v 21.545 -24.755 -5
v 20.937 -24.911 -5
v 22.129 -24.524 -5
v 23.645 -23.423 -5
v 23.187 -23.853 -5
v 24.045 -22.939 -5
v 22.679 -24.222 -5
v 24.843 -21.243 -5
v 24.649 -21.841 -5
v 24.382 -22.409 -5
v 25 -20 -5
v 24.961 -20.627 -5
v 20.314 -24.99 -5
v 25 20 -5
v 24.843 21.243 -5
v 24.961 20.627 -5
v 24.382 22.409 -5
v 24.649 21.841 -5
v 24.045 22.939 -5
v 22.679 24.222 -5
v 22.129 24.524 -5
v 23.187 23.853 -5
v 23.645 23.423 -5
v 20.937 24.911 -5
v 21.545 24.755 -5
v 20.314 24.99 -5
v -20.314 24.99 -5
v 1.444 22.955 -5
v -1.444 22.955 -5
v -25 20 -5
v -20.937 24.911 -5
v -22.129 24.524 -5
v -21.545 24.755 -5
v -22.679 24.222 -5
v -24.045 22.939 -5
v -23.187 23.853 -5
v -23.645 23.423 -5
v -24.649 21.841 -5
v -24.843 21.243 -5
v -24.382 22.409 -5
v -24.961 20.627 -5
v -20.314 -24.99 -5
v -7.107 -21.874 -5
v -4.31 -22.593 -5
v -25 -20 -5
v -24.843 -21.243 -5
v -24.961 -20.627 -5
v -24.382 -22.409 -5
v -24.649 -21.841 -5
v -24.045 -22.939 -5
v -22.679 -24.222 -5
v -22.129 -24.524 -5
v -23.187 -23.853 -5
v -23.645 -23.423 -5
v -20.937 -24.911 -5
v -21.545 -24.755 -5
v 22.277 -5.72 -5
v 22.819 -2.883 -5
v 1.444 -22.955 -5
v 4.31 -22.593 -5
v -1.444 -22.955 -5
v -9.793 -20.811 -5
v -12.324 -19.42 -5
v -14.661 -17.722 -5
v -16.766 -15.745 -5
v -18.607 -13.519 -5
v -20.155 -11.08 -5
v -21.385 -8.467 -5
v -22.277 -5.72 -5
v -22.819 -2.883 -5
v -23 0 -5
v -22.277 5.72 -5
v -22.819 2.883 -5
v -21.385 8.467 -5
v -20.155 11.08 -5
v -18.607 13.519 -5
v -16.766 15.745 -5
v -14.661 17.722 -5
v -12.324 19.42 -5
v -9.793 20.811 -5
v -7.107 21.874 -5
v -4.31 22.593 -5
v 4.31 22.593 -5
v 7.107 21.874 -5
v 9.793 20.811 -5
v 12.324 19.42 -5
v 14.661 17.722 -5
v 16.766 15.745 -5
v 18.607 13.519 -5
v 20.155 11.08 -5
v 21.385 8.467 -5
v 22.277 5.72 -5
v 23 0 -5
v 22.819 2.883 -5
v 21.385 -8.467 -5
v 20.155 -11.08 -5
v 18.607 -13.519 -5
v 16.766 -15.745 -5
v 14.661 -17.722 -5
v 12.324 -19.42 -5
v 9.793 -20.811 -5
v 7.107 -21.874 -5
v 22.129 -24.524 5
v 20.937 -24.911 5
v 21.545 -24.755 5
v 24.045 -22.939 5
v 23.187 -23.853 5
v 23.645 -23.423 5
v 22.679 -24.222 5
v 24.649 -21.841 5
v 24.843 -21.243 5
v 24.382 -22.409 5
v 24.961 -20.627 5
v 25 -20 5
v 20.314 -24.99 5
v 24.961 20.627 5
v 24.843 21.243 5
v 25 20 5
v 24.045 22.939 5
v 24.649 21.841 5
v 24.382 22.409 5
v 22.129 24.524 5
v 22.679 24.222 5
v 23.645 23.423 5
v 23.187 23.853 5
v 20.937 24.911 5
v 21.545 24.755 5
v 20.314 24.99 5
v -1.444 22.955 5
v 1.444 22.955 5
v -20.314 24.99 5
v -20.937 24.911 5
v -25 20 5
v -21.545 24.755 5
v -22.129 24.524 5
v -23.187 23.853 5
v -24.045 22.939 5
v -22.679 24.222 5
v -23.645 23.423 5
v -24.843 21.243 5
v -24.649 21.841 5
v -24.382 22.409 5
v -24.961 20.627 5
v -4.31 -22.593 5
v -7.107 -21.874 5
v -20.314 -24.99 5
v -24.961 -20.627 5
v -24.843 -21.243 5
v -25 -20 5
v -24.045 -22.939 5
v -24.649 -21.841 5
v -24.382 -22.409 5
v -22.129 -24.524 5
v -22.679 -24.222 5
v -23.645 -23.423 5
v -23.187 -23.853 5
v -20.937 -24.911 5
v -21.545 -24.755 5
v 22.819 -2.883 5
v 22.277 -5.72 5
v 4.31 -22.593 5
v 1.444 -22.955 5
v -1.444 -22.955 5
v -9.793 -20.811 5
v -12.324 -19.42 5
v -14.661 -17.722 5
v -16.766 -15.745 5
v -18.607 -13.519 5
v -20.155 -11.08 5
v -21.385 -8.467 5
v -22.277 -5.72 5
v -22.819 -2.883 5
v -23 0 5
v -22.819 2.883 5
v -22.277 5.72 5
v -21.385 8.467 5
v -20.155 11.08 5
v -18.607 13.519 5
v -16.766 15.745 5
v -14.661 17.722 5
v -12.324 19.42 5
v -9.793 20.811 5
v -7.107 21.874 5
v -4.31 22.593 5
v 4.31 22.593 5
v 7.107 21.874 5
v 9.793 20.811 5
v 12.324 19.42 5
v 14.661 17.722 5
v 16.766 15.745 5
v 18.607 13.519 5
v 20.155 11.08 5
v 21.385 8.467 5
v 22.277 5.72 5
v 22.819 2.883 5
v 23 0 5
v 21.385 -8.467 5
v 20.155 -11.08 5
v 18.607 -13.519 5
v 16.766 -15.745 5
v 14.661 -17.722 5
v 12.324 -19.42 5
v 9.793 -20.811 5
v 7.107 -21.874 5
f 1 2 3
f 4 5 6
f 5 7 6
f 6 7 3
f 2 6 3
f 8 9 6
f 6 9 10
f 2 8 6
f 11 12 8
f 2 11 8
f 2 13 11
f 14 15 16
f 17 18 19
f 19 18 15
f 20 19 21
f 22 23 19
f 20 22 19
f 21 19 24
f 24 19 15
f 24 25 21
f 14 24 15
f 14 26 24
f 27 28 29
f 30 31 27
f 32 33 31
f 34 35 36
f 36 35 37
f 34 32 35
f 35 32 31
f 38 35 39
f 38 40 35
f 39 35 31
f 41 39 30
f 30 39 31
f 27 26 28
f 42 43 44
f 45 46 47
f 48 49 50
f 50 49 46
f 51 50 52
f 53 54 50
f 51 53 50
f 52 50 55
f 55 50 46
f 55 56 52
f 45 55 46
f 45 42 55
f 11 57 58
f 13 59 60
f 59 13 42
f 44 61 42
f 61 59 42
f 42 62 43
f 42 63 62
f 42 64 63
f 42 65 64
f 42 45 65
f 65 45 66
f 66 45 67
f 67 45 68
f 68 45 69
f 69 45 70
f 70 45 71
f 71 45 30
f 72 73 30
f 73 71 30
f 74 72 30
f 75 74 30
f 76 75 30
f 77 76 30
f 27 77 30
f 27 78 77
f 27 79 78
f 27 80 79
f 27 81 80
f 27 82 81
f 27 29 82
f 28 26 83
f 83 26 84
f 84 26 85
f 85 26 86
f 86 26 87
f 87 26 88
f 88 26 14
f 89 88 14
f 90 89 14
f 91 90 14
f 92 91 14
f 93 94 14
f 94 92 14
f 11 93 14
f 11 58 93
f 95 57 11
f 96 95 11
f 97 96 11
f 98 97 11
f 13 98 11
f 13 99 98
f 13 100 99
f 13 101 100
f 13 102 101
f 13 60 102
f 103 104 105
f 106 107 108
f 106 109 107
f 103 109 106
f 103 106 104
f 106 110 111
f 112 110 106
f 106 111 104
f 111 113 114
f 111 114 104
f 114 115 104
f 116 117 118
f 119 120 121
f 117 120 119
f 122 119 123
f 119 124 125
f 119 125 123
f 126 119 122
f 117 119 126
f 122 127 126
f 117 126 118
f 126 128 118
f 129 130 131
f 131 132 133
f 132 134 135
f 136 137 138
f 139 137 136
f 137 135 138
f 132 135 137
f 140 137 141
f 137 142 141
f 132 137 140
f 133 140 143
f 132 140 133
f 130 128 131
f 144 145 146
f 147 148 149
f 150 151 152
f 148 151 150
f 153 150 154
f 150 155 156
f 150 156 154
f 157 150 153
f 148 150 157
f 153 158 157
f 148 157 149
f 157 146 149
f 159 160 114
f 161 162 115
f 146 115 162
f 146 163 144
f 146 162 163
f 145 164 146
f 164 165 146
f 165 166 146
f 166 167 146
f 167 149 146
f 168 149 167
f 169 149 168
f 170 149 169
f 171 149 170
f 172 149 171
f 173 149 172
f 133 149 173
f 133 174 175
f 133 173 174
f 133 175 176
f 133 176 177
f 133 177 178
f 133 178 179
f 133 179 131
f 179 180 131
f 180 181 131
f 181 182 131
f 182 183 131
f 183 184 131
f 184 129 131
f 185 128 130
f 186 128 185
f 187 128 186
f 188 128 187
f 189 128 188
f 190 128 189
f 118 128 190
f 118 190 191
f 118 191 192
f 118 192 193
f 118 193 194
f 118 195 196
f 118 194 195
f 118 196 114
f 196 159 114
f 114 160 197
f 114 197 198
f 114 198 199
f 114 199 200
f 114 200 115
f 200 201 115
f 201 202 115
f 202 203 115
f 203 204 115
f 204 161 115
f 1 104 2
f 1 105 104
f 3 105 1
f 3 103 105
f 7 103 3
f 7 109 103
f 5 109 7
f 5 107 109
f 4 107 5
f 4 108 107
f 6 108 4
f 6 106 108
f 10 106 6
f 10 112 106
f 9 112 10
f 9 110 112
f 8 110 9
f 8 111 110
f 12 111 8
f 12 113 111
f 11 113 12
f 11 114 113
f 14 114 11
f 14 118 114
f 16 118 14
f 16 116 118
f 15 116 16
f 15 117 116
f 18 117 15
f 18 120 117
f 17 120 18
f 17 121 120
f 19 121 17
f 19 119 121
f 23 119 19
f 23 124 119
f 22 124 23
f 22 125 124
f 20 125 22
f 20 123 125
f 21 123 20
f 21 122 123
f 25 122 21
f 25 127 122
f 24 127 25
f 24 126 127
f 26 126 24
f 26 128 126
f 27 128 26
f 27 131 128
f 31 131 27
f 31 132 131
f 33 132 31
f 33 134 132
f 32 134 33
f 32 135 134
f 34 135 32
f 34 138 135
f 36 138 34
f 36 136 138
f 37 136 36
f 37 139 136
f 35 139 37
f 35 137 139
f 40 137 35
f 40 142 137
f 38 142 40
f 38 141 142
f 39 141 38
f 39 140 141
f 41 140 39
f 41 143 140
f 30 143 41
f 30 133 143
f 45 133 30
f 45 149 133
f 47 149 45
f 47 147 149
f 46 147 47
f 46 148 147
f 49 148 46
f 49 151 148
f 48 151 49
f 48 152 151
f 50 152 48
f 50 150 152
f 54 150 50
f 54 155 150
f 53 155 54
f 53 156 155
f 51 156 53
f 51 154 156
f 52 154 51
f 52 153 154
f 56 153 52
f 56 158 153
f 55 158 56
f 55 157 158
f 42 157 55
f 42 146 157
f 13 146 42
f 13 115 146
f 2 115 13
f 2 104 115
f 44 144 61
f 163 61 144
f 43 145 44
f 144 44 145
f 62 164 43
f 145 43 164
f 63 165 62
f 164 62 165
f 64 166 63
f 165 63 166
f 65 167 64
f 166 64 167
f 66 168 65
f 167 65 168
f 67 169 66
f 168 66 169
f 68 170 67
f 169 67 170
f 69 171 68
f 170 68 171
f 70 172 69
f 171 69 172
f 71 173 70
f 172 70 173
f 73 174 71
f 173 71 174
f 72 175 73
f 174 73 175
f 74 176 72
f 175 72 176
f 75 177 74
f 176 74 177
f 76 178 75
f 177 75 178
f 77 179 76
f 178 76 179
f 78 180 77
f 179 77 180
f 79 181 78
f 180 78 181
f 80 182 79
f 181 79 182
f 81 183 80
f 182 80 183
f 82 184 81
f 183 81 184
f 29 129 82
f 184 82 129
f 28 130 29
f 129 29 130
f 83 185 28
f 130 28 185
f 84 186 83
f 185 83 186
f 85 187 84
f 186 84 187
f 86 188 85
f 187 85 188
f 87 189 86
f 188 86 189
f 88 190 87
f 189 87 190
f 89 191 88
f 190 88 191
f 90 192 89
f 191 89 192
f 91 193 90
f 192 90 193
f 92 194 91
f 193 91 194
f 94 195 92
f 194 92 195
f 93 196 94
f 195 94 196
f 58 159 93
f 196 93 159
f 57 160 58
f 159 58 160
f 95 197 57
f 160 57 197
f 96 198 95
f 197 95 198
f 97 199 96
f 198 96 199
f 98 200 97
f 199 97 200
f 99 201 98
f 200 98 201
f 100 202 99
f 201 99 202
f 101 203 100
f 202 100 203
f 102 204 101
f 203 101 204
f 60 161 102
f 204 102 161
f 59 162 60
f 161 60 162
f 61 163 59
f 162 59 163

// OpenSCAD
shape_size = 50;        // The side length of the square.
hole_clearance = 2;     // The gap between the square edge and the hole.
object_height = 10;     // The height (thickness) of the 3D object.
corner_radius = 5;      // The radius of the rounded corners.
$fn = 50;

// --- Hole Shape Control ---
square_hole = false; // Set to 'true' for a square hole, 'false' for a circle hole.

// --- Module Definition ---
module extruded_shape() {
	linear_extrude(height = object_height, center = true) {
		difference() {
			// 1. Create the base rounded square.
			minkowski() {
				square(shape_size - (corner_radius * 2), center = true);
				circle(r = corner_radius);
			}
			
			// 2. Subtract the hole based on the control variable.
			if (square_hole) {
				// Creates a square hole
				square(shape_size - (hole_clearance * 2), center = true);
			} else {
				// Creates a circular hole
				circle(d = shape_size - (hole_clearance * 2));
			}
		}
	}
}

// --- Module Execution ---
extruded_shape();
